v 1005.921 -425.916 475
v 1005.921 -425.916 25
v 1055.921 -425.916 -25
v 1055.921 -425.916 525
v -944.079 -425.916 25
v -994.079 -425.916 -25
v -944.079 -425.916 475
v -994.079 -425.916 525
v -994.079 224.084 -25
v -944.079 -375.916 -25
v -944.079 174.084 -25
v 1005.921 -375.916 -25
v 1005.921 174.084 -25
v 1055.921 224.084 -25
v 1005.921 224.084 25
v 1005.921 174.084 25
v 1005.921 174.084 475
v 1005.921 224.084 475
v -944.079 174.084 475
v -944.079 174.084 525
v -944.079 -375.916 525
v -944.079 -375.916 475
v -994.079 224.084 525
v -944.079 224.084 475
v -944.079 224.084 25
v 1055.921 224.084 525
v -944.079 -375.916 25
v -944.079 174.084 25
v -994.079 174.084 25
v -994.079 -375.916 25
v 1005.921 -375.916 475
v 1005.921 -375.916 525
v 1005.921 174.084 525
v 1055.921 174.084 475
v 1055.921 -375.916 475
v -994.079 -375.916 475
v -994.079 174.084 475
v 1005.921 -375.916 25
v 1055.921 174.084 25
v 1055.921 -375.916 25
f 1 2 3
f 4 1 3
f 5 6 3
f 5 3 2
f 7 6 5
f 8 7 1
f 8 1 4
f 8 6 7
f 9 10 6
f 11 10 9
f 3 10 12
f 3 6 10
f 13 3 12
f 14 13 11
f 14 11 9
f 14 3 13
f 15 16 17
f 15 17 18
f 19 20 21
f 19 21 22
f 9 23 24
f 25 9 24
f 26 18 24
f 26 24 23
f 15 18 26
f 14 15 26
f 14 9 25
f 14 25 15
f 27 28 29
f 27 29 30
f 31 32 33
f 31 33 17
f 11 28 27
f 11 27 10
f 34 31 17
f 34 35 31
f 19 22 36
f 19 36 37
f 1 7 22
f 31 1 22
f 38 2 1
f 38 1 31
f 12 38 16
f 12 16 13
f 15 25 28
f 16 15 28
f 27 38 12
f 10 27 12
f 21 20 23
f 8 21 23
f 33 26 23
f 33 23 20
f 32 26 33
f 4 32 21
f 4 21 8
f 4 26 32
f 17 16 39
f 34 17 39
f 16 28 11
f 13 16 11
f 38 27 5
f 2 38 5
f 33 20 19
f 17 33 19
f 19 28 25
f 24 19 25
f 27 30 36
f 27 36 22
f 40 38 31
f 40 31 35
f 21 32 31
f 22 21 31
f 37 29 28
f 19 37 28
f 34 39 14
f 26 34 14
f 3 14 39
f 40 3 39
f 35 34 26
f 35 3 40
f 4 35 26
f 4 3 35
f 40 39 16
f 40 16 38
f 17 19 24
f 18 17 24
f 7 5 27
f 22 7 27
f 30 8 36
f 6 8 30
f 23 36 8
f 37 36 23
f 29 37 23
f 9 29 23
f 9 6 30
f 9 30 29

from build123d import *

# Parameters (mm, degrees)
F1_W     = 50
F1_H     = 50
F4_W     = 50
F4_H     = 50
F5_DEPTH = 450


with BuildPart() as f2:
    # F2: sweep along a path in F0
    with BuildLine(Plane.XY) as f2_path:
        Line((-969.0792792215, 199.0843022242), (1030.9207207785, 199.0843022242))
        Line((1030.9207207785, 199.0843022242), (1030.9207207785, -400.9156977758))
        Line((1030.9207207785, -400.9156977758), (-969.0792792215, -400.9156977758))
        Line((-969.0792792215, -400.9156977758), (-969.0792792215, 199.0843022242))
    # F1 (on Right) → F2 (sweep)
    with BuildSketch(Plane.YZ):
        with Locations((199.0843022242, 0)):
            Rectangle(F1_W, F1_H)
    sweep(path=f2_path.line, transition=Transition.RIGHT)


with BuildPart() as f3_1:
    # F3: copy of F2
    add(f2.part.moved(Location((0, 0, 500))))


with BuildPart() as f2_1:
    add(f2.part)

    add(f3_1.part)  # F5 merges F3_1
    # F4 (on face) → F5 (join, through all)
    with BuildSketch(Plane.XY.offset(25)):
        with Locations((-969.0792792215, 199.0843022242)):
            Rectangle(F4_W, F4_H)
        with Locations((-969.0792792215, -400.9156977758)):
            Rectangle(F4_W, F4_H)
        with Locations((1030.9207207785, -400.9156977758)):
            Rectangle(F4_W, F4_H)
        with Locations((1030.9207207785, 199.0843022242)):
            Rectangle(F4_W, F4_H)
    extrude(amount=F5_DEPTH)


solid = f2_1.part
